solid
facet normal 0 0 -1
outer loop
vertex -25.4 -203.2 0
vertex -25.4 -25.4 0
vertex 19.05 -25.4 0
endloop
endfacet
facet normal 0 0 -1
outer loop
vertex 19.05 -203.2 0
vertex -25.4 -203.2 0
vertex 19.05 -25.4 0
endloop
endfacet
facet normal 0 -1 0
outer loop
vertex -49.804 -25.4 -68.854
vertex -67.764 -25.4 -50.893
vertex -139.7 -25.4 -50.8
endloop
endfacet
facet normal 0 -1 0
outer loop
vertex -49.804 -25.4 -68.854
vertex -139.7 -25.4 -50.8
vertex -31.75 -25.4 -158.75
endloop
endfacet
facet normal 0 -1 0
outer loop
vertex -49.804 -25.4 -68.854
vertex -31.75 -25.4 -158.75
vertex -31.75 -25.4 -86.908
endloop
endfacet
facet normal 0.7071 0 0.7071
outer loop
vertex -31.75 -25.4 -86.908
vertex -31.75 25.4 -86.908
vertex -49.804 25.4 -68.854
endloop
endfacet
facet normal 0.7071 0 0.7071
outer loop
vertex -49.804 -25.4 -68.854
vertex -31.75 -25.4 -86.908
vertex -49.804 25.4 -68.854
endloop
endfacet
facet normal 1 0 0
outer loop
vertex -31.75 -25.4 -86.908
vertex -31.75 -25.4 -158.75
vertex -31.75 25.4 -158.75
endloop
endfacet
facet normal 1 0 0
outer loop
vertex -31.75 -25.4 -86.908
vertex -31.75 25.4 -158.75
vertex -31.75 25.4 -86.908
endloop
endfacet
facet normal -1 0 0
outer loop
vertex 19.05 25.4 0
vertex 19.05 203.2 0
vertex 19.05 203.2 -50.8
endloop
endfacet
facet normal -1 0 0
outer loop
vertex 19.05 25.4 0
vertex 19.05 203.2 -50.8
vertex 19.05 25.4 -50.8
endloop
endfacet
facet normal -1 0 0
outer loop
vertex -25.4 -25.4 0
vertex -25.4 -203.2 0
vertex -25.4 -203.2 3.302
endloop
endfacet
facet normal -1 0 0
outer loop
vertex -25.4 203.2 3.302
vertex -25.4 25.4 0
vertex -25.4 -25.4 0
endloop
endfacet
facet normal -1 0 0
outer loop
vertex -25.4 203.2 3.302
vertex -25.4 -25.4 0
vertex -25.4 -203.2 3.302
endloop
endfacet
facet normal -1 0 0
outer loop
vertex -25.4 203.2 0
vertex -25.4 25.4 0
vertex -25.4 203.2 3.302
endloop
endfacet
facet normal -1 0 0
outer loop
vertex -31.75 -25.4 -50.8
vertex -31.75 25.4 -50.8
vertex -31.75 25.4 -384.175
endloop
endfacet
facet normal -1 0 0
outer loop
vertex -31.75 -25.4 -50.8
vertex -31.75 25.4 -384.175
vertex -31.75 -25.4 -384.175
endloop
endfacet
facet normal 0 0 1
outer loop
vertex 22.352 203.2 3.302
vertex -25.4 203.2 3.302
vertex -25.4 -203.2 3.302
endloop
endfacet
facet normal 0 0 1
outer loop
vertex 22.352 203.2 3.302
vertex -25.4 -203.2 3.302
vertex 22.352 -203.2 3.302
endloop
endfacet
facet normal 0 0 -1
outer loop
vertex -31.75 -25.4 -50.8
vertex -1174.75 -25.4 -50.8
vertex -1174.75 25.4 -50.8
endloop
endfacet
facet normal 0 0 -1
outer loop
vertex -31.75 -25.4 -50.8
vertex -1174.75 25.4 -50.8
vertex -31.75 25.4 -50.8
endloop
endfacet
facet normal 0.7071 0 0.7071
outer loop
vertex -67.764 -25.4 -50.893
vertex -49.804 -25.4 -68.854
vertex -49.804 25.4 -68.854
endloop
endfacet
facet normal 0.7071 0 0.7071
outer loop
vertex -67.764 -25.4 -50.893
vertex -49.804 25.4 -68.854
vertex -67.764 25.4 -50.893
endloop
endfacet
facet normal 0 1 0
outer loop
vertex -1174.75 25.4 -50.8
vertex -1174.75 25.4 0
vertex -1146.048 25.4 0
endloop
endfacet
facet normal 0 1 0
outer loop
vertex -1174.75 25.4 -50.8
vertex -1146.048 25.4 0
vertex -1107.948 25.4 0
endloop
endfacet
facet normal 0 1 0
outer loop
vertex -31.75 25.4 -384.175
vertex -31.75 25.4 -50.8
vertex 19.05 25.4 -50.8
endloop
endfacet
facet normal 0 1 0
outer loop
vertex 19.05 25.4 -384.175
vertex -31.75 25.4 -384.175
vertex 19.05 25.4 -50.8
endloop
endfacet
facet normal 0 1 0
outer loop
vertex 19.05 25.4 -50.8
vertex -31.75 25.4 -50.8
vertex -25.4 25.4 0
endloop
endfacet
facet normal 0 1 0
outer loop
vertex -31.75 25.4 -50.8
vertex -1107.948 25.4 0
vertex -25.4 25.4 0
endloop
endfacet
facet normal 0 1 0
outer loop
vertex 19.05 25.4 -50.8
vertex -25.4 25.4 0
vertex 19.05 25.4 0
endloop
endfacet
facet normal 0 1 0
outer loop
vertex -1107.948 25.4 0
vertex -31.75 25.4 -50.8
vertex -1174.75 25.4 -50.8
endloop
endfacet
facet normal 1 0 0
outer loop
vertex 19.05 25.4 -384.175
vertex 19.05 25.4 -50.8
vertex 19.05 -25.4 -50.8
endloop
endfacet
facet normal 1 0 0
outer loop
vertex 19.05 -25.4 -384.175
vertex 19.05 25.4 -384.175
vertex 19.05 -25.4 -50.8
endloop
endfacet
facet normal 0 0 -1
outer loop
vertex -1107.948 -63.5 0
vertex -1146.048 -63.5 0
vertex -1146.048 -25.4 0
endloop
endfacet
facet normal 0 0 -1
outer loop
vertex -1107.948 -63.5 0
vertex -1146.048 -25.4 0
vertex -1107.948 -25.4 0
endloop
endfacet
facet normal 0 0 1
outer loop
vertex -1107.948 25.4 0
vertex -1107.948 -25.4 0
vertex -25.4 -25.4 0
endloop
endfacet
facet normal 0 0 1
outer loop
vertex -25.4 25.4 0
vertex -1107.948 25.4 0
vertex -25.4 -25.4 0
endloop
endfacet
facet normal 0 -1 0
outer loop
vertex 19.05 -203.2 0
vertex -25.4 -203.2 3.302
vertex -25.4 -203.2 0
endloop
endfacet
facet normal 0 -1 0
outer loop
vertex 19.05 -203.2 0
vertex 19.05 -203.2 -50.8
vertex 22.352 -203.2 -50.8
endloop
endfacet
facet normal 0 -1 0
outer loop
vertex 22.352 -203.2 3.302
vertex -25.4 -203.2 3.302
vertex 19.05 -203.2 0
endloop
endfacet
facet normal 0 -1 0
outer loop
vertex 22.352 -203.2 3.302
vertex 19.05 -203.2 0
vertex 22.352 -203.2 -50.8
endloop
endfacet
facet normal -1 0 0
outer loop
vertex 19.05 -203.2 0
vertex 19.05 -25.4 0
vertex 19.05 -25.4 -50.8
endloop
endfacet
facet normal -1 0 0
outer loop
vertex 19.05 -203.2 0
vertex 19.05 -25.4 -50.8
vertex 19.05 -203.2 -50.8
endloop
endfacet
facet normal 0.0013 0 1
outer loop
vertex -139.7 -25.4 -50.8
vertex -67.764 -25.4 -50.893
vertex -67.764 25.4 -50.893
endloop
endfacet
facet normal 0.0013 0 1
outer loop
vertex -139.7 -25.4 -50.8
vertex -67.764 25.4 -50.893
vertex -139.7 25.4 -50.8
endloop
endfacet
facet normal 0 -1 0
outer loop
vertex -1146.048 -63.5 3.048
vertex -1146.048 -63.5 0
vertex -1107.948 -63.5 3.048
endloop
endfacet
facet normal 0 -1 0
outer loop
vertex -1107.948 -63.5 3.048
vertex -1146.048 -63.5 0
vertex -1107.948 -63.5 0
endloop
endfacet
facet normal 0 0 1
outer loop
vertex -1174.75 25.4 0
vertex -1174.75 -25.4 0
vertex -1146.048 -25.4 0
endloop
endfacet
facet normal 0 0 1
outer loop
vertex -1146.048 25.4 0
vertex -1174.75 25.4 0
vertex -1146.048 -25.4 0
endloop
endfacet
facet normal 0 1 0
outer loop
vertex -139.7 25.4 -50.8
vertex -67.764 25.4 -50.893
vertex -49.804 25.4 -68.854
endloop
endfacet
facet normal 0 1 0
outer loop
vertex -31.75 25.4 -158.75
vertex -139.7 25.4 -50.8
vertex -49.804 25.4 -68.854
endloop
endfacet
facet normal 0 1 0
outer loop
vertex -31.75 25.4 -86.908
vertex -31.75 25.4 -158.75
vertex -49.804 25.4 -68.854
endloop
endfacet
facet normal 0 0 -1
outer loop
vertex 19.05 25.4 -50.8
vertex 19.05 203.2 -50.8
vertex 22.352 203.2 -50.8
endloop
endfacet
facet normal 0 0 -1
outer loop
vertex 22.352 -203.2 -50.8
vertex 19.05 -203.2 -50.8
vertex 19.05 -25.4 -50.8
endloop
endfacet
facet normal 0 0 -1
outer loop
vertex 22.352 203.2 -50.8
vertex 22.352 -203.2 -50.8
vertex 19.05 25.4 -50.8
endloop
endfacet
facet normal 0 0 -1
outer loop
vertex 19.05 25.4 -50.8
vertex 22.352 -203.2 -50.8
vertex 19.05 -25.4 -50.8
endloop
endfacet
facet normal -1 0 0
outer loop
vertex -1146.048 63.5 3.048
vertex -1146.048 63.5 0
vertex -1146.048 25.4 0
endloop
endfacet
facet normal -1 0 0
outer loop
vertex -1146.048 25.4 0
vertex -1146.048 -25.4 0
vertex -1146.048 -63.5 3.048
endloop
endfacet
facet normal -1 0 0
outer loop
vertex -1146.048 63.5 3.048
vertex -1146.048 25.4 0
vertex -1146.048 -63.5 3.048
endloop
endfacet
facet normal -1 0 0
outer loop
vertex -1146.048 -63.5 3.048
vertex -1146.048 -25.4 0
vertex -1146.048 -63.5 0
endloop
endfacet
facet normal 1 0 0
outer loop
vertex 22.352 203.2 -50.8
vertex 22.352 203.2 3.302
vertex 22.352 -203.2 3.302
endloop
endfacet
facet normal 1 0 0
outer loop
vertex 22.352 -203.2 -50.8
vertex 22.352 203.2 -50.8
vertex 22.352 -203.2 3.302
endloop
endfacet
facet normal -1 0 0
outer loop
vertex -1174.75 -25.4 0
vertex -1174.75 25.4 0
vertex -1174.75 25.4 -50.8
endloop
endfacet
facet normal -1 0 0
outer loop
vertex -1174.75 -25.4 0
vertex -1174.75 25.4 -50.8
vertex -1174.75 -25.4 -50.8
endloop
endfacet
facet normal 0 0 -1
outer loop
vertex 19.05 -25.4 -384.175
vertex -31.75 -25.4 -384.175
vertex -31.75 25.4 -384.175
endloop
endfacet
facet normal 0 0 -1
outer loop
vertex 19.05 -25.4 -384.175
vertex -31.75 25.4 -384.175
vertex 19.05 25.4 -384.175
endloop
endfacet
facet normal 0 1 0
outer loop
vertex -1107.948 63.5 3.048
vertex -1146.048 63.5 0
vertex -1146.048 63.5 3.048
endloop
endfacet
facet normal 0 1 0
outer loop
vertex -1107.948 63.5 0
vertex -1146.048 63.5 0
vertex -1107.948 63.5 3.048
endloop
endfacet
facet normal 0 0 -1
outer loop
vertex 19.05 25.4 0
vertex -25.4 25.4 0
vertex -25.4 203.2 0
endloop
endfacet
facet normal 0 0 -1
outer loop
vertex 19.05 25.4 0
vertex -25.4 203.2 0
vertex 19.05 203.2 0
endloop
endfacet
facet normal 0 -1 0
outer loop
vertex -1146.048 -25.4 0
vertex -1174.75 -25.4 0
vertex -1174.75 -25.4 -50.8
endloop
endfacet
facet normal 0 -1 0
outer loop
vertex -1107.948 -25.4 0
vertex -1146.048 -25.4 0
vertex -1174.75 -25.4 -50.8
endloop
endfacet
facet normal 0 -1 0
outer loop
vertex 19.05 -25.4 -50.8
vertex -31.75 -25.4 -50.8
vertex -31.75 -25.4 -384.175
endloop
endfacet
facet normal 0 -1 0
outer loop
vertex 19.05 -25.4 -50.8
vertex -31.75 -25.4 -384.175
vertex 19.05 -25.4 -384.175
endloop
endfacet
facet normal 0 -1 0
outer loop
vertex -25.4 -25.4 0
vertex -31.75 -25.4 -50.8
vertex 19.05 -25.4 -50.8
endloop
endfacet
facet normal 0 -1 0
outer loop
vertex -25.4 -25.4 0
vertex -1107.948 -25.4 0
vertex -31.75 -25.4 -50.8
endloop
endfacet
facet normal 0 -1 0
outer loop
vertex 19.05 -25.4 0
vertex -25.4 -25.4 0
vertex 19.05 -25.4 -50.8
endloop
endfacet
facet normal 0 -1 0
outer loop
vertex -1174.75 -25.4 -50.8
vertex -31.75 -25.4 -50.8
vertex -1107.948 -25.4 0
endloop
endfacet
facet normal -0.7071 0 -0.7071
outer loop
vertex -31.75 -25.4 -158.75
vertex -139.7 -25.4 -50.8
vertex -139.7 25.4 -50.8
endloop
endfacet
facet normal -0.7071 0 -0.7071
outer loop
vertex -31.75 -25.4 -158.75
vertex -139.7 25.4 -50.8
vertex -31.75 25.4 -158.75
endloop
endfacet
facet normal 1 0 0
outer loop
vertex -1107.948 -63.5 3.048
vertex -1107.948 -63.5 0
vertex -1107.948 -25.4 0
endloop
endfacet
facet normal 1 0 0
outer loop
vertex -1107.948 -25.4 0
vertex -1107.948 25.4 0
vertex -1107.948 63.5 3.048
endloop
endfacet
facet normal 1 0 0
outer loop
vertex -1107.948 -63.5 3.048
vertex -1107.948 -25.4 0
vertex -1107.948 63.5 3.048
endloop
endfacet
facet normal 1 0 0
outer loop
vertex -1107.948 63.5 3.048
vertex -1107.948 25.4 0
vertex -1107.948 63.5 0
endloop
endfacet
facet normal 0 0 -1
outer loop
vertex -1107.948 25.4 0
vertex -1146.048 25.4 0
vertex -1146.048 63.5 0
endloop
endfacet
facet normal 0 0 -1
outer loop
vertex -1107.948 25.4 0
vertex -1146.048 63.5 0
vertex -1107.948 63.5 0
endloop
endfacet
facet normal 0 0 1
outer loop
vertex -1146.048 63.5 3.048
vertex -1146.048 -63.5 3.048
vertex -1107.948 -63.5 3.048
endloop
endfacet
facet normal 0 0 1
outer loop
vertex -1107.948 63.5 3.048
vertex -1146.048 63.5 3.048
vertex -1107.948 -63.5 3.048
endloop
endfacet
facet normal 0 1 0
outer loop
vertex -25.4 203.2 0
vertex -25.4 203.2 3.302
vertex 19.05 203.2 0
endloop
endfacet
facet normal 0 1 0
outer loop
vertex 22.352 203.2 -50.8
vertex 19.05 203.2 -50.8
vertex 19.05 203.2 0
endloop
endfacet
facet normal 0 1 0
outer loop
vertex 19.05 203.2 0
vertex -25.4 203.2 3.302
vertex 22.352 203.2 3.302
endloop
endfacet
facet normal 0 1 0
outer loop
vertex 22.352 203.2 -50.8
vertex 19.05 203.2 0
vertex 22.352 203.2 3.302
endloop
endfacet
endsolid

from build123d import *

# Parameters (mm, degrees)
F0_W      = 50.8
F0_H      = 406.4
F1_DEPTH  = 6.35
F2_W      = 6.35
F2_H      = 406.4
F3_DEPTH  = 50.8
F4_DEPTH  = 3.048
F5_DEPTH  = 3.048
F6_W      = 1149.35
F6_H      = 50.8
F7_DEPTH  = 50.8
F8_W      = 38.1
F8_H      = 50.8
F8_H_2    = 38.1
F9_DEPTH  = 3.048
F10_W     = 50.8
F10_H     = 50.8
F11_DEPTH = 333.375
F13_DEPTH = 50.8


# Not quite as in the source:
# - a feature names something its author has since deleted; it is built from what else it names


with BuildPart() as f1:
    # F0 (on Top) → F1 (new body)
    with BuildSketch(Plane.XY):
        Rectangle(F0_W, F0_H)
    extrude(amount=F1_DEPTH)

    # F2 (on face) → F3 (join)
    with BuildSketch(Plane(origin=(0, 0, 0), x_dir=(1, 0, 0), z_dir=(0, 0, -1))):
        with Locations((22.225, 0)):
            Rectangle(F2_W, F2_H)
    extrude(amount=F3_DEPTH)

    # F4 (cut): a face of the model
    f4_faces = [f1.faces().sort_by_distance(p)[0] for p in [
        (25.4, 0, -22.225),
    ]]
    extrude(f4_faces, amount=-F4_DEPTH, mode=Mode.SUBTRACT)

    # F5 (cut): a face of the model
    f5_faces = [f1.faces().sort_by_distance(p)[0] for p in [
        (-1.524, 0, 6.35),
    ]]
    extrude(f5_faces, amount=-F5_DEPTH, mode=Mode.SUBTRACT)

    # F6 (on face) → F7 (join)
    with BuildSketch(Plane(origin=(0, 0, 0), x_dir=(1, 0, 0), z_dir=(0, 0, -1))):
        Polygon((19.05, -25.4), (19.05, 0), (19.05, 25.4), (-25.4, 25.4), (-25.4, -25.4), align=None)
        with Locations((-600.075, 0)):
            Rectangle(F6_W, F6_H)
    extrude(amount=F7_DEPTH)

    # F8 (on face) → F9 (join)
    with BuildSketch(Plane.XY):
        with Locations((-1126.998, 0)):
            Rectangle(F8_W, F8_H)
        with Locations((-1126.998, 44.45)):
            Rectangle(F8_W, F8_H_2)
        with Locations((-1126.998, -44.45)):
            Rectangle(F8_W, F8_H_2)
    extrude(amount=F9_DEPTH)

    # F10 (on face) → F11 (join)
    with BuildSketch(Plane(origin=(0, 0, -50.8), x_dir=(1, 0, 0), z_dir=(0, 0, -1))):
        with Locations((-6.35, 0)):
            Rectangle(F10_W, F10_H)
    extrude(amount=F11_DEPTH)


with BuildPart() as f13:
    # F12 (on face) → F13 (new body)
    with BuildSketch(Plane.XZ.offset(25.4)):
        Polygon((-67.7644877579, -50.8934632736), (-139.7, -50.8), (-31.75, -158.75), (-31.75, -86.9079510314), (-49.8039755157, -68.8539755157), align=None)
    extrude(amount=-F13_DEPTH)


solid = Compound([f1.part, f13.part])
